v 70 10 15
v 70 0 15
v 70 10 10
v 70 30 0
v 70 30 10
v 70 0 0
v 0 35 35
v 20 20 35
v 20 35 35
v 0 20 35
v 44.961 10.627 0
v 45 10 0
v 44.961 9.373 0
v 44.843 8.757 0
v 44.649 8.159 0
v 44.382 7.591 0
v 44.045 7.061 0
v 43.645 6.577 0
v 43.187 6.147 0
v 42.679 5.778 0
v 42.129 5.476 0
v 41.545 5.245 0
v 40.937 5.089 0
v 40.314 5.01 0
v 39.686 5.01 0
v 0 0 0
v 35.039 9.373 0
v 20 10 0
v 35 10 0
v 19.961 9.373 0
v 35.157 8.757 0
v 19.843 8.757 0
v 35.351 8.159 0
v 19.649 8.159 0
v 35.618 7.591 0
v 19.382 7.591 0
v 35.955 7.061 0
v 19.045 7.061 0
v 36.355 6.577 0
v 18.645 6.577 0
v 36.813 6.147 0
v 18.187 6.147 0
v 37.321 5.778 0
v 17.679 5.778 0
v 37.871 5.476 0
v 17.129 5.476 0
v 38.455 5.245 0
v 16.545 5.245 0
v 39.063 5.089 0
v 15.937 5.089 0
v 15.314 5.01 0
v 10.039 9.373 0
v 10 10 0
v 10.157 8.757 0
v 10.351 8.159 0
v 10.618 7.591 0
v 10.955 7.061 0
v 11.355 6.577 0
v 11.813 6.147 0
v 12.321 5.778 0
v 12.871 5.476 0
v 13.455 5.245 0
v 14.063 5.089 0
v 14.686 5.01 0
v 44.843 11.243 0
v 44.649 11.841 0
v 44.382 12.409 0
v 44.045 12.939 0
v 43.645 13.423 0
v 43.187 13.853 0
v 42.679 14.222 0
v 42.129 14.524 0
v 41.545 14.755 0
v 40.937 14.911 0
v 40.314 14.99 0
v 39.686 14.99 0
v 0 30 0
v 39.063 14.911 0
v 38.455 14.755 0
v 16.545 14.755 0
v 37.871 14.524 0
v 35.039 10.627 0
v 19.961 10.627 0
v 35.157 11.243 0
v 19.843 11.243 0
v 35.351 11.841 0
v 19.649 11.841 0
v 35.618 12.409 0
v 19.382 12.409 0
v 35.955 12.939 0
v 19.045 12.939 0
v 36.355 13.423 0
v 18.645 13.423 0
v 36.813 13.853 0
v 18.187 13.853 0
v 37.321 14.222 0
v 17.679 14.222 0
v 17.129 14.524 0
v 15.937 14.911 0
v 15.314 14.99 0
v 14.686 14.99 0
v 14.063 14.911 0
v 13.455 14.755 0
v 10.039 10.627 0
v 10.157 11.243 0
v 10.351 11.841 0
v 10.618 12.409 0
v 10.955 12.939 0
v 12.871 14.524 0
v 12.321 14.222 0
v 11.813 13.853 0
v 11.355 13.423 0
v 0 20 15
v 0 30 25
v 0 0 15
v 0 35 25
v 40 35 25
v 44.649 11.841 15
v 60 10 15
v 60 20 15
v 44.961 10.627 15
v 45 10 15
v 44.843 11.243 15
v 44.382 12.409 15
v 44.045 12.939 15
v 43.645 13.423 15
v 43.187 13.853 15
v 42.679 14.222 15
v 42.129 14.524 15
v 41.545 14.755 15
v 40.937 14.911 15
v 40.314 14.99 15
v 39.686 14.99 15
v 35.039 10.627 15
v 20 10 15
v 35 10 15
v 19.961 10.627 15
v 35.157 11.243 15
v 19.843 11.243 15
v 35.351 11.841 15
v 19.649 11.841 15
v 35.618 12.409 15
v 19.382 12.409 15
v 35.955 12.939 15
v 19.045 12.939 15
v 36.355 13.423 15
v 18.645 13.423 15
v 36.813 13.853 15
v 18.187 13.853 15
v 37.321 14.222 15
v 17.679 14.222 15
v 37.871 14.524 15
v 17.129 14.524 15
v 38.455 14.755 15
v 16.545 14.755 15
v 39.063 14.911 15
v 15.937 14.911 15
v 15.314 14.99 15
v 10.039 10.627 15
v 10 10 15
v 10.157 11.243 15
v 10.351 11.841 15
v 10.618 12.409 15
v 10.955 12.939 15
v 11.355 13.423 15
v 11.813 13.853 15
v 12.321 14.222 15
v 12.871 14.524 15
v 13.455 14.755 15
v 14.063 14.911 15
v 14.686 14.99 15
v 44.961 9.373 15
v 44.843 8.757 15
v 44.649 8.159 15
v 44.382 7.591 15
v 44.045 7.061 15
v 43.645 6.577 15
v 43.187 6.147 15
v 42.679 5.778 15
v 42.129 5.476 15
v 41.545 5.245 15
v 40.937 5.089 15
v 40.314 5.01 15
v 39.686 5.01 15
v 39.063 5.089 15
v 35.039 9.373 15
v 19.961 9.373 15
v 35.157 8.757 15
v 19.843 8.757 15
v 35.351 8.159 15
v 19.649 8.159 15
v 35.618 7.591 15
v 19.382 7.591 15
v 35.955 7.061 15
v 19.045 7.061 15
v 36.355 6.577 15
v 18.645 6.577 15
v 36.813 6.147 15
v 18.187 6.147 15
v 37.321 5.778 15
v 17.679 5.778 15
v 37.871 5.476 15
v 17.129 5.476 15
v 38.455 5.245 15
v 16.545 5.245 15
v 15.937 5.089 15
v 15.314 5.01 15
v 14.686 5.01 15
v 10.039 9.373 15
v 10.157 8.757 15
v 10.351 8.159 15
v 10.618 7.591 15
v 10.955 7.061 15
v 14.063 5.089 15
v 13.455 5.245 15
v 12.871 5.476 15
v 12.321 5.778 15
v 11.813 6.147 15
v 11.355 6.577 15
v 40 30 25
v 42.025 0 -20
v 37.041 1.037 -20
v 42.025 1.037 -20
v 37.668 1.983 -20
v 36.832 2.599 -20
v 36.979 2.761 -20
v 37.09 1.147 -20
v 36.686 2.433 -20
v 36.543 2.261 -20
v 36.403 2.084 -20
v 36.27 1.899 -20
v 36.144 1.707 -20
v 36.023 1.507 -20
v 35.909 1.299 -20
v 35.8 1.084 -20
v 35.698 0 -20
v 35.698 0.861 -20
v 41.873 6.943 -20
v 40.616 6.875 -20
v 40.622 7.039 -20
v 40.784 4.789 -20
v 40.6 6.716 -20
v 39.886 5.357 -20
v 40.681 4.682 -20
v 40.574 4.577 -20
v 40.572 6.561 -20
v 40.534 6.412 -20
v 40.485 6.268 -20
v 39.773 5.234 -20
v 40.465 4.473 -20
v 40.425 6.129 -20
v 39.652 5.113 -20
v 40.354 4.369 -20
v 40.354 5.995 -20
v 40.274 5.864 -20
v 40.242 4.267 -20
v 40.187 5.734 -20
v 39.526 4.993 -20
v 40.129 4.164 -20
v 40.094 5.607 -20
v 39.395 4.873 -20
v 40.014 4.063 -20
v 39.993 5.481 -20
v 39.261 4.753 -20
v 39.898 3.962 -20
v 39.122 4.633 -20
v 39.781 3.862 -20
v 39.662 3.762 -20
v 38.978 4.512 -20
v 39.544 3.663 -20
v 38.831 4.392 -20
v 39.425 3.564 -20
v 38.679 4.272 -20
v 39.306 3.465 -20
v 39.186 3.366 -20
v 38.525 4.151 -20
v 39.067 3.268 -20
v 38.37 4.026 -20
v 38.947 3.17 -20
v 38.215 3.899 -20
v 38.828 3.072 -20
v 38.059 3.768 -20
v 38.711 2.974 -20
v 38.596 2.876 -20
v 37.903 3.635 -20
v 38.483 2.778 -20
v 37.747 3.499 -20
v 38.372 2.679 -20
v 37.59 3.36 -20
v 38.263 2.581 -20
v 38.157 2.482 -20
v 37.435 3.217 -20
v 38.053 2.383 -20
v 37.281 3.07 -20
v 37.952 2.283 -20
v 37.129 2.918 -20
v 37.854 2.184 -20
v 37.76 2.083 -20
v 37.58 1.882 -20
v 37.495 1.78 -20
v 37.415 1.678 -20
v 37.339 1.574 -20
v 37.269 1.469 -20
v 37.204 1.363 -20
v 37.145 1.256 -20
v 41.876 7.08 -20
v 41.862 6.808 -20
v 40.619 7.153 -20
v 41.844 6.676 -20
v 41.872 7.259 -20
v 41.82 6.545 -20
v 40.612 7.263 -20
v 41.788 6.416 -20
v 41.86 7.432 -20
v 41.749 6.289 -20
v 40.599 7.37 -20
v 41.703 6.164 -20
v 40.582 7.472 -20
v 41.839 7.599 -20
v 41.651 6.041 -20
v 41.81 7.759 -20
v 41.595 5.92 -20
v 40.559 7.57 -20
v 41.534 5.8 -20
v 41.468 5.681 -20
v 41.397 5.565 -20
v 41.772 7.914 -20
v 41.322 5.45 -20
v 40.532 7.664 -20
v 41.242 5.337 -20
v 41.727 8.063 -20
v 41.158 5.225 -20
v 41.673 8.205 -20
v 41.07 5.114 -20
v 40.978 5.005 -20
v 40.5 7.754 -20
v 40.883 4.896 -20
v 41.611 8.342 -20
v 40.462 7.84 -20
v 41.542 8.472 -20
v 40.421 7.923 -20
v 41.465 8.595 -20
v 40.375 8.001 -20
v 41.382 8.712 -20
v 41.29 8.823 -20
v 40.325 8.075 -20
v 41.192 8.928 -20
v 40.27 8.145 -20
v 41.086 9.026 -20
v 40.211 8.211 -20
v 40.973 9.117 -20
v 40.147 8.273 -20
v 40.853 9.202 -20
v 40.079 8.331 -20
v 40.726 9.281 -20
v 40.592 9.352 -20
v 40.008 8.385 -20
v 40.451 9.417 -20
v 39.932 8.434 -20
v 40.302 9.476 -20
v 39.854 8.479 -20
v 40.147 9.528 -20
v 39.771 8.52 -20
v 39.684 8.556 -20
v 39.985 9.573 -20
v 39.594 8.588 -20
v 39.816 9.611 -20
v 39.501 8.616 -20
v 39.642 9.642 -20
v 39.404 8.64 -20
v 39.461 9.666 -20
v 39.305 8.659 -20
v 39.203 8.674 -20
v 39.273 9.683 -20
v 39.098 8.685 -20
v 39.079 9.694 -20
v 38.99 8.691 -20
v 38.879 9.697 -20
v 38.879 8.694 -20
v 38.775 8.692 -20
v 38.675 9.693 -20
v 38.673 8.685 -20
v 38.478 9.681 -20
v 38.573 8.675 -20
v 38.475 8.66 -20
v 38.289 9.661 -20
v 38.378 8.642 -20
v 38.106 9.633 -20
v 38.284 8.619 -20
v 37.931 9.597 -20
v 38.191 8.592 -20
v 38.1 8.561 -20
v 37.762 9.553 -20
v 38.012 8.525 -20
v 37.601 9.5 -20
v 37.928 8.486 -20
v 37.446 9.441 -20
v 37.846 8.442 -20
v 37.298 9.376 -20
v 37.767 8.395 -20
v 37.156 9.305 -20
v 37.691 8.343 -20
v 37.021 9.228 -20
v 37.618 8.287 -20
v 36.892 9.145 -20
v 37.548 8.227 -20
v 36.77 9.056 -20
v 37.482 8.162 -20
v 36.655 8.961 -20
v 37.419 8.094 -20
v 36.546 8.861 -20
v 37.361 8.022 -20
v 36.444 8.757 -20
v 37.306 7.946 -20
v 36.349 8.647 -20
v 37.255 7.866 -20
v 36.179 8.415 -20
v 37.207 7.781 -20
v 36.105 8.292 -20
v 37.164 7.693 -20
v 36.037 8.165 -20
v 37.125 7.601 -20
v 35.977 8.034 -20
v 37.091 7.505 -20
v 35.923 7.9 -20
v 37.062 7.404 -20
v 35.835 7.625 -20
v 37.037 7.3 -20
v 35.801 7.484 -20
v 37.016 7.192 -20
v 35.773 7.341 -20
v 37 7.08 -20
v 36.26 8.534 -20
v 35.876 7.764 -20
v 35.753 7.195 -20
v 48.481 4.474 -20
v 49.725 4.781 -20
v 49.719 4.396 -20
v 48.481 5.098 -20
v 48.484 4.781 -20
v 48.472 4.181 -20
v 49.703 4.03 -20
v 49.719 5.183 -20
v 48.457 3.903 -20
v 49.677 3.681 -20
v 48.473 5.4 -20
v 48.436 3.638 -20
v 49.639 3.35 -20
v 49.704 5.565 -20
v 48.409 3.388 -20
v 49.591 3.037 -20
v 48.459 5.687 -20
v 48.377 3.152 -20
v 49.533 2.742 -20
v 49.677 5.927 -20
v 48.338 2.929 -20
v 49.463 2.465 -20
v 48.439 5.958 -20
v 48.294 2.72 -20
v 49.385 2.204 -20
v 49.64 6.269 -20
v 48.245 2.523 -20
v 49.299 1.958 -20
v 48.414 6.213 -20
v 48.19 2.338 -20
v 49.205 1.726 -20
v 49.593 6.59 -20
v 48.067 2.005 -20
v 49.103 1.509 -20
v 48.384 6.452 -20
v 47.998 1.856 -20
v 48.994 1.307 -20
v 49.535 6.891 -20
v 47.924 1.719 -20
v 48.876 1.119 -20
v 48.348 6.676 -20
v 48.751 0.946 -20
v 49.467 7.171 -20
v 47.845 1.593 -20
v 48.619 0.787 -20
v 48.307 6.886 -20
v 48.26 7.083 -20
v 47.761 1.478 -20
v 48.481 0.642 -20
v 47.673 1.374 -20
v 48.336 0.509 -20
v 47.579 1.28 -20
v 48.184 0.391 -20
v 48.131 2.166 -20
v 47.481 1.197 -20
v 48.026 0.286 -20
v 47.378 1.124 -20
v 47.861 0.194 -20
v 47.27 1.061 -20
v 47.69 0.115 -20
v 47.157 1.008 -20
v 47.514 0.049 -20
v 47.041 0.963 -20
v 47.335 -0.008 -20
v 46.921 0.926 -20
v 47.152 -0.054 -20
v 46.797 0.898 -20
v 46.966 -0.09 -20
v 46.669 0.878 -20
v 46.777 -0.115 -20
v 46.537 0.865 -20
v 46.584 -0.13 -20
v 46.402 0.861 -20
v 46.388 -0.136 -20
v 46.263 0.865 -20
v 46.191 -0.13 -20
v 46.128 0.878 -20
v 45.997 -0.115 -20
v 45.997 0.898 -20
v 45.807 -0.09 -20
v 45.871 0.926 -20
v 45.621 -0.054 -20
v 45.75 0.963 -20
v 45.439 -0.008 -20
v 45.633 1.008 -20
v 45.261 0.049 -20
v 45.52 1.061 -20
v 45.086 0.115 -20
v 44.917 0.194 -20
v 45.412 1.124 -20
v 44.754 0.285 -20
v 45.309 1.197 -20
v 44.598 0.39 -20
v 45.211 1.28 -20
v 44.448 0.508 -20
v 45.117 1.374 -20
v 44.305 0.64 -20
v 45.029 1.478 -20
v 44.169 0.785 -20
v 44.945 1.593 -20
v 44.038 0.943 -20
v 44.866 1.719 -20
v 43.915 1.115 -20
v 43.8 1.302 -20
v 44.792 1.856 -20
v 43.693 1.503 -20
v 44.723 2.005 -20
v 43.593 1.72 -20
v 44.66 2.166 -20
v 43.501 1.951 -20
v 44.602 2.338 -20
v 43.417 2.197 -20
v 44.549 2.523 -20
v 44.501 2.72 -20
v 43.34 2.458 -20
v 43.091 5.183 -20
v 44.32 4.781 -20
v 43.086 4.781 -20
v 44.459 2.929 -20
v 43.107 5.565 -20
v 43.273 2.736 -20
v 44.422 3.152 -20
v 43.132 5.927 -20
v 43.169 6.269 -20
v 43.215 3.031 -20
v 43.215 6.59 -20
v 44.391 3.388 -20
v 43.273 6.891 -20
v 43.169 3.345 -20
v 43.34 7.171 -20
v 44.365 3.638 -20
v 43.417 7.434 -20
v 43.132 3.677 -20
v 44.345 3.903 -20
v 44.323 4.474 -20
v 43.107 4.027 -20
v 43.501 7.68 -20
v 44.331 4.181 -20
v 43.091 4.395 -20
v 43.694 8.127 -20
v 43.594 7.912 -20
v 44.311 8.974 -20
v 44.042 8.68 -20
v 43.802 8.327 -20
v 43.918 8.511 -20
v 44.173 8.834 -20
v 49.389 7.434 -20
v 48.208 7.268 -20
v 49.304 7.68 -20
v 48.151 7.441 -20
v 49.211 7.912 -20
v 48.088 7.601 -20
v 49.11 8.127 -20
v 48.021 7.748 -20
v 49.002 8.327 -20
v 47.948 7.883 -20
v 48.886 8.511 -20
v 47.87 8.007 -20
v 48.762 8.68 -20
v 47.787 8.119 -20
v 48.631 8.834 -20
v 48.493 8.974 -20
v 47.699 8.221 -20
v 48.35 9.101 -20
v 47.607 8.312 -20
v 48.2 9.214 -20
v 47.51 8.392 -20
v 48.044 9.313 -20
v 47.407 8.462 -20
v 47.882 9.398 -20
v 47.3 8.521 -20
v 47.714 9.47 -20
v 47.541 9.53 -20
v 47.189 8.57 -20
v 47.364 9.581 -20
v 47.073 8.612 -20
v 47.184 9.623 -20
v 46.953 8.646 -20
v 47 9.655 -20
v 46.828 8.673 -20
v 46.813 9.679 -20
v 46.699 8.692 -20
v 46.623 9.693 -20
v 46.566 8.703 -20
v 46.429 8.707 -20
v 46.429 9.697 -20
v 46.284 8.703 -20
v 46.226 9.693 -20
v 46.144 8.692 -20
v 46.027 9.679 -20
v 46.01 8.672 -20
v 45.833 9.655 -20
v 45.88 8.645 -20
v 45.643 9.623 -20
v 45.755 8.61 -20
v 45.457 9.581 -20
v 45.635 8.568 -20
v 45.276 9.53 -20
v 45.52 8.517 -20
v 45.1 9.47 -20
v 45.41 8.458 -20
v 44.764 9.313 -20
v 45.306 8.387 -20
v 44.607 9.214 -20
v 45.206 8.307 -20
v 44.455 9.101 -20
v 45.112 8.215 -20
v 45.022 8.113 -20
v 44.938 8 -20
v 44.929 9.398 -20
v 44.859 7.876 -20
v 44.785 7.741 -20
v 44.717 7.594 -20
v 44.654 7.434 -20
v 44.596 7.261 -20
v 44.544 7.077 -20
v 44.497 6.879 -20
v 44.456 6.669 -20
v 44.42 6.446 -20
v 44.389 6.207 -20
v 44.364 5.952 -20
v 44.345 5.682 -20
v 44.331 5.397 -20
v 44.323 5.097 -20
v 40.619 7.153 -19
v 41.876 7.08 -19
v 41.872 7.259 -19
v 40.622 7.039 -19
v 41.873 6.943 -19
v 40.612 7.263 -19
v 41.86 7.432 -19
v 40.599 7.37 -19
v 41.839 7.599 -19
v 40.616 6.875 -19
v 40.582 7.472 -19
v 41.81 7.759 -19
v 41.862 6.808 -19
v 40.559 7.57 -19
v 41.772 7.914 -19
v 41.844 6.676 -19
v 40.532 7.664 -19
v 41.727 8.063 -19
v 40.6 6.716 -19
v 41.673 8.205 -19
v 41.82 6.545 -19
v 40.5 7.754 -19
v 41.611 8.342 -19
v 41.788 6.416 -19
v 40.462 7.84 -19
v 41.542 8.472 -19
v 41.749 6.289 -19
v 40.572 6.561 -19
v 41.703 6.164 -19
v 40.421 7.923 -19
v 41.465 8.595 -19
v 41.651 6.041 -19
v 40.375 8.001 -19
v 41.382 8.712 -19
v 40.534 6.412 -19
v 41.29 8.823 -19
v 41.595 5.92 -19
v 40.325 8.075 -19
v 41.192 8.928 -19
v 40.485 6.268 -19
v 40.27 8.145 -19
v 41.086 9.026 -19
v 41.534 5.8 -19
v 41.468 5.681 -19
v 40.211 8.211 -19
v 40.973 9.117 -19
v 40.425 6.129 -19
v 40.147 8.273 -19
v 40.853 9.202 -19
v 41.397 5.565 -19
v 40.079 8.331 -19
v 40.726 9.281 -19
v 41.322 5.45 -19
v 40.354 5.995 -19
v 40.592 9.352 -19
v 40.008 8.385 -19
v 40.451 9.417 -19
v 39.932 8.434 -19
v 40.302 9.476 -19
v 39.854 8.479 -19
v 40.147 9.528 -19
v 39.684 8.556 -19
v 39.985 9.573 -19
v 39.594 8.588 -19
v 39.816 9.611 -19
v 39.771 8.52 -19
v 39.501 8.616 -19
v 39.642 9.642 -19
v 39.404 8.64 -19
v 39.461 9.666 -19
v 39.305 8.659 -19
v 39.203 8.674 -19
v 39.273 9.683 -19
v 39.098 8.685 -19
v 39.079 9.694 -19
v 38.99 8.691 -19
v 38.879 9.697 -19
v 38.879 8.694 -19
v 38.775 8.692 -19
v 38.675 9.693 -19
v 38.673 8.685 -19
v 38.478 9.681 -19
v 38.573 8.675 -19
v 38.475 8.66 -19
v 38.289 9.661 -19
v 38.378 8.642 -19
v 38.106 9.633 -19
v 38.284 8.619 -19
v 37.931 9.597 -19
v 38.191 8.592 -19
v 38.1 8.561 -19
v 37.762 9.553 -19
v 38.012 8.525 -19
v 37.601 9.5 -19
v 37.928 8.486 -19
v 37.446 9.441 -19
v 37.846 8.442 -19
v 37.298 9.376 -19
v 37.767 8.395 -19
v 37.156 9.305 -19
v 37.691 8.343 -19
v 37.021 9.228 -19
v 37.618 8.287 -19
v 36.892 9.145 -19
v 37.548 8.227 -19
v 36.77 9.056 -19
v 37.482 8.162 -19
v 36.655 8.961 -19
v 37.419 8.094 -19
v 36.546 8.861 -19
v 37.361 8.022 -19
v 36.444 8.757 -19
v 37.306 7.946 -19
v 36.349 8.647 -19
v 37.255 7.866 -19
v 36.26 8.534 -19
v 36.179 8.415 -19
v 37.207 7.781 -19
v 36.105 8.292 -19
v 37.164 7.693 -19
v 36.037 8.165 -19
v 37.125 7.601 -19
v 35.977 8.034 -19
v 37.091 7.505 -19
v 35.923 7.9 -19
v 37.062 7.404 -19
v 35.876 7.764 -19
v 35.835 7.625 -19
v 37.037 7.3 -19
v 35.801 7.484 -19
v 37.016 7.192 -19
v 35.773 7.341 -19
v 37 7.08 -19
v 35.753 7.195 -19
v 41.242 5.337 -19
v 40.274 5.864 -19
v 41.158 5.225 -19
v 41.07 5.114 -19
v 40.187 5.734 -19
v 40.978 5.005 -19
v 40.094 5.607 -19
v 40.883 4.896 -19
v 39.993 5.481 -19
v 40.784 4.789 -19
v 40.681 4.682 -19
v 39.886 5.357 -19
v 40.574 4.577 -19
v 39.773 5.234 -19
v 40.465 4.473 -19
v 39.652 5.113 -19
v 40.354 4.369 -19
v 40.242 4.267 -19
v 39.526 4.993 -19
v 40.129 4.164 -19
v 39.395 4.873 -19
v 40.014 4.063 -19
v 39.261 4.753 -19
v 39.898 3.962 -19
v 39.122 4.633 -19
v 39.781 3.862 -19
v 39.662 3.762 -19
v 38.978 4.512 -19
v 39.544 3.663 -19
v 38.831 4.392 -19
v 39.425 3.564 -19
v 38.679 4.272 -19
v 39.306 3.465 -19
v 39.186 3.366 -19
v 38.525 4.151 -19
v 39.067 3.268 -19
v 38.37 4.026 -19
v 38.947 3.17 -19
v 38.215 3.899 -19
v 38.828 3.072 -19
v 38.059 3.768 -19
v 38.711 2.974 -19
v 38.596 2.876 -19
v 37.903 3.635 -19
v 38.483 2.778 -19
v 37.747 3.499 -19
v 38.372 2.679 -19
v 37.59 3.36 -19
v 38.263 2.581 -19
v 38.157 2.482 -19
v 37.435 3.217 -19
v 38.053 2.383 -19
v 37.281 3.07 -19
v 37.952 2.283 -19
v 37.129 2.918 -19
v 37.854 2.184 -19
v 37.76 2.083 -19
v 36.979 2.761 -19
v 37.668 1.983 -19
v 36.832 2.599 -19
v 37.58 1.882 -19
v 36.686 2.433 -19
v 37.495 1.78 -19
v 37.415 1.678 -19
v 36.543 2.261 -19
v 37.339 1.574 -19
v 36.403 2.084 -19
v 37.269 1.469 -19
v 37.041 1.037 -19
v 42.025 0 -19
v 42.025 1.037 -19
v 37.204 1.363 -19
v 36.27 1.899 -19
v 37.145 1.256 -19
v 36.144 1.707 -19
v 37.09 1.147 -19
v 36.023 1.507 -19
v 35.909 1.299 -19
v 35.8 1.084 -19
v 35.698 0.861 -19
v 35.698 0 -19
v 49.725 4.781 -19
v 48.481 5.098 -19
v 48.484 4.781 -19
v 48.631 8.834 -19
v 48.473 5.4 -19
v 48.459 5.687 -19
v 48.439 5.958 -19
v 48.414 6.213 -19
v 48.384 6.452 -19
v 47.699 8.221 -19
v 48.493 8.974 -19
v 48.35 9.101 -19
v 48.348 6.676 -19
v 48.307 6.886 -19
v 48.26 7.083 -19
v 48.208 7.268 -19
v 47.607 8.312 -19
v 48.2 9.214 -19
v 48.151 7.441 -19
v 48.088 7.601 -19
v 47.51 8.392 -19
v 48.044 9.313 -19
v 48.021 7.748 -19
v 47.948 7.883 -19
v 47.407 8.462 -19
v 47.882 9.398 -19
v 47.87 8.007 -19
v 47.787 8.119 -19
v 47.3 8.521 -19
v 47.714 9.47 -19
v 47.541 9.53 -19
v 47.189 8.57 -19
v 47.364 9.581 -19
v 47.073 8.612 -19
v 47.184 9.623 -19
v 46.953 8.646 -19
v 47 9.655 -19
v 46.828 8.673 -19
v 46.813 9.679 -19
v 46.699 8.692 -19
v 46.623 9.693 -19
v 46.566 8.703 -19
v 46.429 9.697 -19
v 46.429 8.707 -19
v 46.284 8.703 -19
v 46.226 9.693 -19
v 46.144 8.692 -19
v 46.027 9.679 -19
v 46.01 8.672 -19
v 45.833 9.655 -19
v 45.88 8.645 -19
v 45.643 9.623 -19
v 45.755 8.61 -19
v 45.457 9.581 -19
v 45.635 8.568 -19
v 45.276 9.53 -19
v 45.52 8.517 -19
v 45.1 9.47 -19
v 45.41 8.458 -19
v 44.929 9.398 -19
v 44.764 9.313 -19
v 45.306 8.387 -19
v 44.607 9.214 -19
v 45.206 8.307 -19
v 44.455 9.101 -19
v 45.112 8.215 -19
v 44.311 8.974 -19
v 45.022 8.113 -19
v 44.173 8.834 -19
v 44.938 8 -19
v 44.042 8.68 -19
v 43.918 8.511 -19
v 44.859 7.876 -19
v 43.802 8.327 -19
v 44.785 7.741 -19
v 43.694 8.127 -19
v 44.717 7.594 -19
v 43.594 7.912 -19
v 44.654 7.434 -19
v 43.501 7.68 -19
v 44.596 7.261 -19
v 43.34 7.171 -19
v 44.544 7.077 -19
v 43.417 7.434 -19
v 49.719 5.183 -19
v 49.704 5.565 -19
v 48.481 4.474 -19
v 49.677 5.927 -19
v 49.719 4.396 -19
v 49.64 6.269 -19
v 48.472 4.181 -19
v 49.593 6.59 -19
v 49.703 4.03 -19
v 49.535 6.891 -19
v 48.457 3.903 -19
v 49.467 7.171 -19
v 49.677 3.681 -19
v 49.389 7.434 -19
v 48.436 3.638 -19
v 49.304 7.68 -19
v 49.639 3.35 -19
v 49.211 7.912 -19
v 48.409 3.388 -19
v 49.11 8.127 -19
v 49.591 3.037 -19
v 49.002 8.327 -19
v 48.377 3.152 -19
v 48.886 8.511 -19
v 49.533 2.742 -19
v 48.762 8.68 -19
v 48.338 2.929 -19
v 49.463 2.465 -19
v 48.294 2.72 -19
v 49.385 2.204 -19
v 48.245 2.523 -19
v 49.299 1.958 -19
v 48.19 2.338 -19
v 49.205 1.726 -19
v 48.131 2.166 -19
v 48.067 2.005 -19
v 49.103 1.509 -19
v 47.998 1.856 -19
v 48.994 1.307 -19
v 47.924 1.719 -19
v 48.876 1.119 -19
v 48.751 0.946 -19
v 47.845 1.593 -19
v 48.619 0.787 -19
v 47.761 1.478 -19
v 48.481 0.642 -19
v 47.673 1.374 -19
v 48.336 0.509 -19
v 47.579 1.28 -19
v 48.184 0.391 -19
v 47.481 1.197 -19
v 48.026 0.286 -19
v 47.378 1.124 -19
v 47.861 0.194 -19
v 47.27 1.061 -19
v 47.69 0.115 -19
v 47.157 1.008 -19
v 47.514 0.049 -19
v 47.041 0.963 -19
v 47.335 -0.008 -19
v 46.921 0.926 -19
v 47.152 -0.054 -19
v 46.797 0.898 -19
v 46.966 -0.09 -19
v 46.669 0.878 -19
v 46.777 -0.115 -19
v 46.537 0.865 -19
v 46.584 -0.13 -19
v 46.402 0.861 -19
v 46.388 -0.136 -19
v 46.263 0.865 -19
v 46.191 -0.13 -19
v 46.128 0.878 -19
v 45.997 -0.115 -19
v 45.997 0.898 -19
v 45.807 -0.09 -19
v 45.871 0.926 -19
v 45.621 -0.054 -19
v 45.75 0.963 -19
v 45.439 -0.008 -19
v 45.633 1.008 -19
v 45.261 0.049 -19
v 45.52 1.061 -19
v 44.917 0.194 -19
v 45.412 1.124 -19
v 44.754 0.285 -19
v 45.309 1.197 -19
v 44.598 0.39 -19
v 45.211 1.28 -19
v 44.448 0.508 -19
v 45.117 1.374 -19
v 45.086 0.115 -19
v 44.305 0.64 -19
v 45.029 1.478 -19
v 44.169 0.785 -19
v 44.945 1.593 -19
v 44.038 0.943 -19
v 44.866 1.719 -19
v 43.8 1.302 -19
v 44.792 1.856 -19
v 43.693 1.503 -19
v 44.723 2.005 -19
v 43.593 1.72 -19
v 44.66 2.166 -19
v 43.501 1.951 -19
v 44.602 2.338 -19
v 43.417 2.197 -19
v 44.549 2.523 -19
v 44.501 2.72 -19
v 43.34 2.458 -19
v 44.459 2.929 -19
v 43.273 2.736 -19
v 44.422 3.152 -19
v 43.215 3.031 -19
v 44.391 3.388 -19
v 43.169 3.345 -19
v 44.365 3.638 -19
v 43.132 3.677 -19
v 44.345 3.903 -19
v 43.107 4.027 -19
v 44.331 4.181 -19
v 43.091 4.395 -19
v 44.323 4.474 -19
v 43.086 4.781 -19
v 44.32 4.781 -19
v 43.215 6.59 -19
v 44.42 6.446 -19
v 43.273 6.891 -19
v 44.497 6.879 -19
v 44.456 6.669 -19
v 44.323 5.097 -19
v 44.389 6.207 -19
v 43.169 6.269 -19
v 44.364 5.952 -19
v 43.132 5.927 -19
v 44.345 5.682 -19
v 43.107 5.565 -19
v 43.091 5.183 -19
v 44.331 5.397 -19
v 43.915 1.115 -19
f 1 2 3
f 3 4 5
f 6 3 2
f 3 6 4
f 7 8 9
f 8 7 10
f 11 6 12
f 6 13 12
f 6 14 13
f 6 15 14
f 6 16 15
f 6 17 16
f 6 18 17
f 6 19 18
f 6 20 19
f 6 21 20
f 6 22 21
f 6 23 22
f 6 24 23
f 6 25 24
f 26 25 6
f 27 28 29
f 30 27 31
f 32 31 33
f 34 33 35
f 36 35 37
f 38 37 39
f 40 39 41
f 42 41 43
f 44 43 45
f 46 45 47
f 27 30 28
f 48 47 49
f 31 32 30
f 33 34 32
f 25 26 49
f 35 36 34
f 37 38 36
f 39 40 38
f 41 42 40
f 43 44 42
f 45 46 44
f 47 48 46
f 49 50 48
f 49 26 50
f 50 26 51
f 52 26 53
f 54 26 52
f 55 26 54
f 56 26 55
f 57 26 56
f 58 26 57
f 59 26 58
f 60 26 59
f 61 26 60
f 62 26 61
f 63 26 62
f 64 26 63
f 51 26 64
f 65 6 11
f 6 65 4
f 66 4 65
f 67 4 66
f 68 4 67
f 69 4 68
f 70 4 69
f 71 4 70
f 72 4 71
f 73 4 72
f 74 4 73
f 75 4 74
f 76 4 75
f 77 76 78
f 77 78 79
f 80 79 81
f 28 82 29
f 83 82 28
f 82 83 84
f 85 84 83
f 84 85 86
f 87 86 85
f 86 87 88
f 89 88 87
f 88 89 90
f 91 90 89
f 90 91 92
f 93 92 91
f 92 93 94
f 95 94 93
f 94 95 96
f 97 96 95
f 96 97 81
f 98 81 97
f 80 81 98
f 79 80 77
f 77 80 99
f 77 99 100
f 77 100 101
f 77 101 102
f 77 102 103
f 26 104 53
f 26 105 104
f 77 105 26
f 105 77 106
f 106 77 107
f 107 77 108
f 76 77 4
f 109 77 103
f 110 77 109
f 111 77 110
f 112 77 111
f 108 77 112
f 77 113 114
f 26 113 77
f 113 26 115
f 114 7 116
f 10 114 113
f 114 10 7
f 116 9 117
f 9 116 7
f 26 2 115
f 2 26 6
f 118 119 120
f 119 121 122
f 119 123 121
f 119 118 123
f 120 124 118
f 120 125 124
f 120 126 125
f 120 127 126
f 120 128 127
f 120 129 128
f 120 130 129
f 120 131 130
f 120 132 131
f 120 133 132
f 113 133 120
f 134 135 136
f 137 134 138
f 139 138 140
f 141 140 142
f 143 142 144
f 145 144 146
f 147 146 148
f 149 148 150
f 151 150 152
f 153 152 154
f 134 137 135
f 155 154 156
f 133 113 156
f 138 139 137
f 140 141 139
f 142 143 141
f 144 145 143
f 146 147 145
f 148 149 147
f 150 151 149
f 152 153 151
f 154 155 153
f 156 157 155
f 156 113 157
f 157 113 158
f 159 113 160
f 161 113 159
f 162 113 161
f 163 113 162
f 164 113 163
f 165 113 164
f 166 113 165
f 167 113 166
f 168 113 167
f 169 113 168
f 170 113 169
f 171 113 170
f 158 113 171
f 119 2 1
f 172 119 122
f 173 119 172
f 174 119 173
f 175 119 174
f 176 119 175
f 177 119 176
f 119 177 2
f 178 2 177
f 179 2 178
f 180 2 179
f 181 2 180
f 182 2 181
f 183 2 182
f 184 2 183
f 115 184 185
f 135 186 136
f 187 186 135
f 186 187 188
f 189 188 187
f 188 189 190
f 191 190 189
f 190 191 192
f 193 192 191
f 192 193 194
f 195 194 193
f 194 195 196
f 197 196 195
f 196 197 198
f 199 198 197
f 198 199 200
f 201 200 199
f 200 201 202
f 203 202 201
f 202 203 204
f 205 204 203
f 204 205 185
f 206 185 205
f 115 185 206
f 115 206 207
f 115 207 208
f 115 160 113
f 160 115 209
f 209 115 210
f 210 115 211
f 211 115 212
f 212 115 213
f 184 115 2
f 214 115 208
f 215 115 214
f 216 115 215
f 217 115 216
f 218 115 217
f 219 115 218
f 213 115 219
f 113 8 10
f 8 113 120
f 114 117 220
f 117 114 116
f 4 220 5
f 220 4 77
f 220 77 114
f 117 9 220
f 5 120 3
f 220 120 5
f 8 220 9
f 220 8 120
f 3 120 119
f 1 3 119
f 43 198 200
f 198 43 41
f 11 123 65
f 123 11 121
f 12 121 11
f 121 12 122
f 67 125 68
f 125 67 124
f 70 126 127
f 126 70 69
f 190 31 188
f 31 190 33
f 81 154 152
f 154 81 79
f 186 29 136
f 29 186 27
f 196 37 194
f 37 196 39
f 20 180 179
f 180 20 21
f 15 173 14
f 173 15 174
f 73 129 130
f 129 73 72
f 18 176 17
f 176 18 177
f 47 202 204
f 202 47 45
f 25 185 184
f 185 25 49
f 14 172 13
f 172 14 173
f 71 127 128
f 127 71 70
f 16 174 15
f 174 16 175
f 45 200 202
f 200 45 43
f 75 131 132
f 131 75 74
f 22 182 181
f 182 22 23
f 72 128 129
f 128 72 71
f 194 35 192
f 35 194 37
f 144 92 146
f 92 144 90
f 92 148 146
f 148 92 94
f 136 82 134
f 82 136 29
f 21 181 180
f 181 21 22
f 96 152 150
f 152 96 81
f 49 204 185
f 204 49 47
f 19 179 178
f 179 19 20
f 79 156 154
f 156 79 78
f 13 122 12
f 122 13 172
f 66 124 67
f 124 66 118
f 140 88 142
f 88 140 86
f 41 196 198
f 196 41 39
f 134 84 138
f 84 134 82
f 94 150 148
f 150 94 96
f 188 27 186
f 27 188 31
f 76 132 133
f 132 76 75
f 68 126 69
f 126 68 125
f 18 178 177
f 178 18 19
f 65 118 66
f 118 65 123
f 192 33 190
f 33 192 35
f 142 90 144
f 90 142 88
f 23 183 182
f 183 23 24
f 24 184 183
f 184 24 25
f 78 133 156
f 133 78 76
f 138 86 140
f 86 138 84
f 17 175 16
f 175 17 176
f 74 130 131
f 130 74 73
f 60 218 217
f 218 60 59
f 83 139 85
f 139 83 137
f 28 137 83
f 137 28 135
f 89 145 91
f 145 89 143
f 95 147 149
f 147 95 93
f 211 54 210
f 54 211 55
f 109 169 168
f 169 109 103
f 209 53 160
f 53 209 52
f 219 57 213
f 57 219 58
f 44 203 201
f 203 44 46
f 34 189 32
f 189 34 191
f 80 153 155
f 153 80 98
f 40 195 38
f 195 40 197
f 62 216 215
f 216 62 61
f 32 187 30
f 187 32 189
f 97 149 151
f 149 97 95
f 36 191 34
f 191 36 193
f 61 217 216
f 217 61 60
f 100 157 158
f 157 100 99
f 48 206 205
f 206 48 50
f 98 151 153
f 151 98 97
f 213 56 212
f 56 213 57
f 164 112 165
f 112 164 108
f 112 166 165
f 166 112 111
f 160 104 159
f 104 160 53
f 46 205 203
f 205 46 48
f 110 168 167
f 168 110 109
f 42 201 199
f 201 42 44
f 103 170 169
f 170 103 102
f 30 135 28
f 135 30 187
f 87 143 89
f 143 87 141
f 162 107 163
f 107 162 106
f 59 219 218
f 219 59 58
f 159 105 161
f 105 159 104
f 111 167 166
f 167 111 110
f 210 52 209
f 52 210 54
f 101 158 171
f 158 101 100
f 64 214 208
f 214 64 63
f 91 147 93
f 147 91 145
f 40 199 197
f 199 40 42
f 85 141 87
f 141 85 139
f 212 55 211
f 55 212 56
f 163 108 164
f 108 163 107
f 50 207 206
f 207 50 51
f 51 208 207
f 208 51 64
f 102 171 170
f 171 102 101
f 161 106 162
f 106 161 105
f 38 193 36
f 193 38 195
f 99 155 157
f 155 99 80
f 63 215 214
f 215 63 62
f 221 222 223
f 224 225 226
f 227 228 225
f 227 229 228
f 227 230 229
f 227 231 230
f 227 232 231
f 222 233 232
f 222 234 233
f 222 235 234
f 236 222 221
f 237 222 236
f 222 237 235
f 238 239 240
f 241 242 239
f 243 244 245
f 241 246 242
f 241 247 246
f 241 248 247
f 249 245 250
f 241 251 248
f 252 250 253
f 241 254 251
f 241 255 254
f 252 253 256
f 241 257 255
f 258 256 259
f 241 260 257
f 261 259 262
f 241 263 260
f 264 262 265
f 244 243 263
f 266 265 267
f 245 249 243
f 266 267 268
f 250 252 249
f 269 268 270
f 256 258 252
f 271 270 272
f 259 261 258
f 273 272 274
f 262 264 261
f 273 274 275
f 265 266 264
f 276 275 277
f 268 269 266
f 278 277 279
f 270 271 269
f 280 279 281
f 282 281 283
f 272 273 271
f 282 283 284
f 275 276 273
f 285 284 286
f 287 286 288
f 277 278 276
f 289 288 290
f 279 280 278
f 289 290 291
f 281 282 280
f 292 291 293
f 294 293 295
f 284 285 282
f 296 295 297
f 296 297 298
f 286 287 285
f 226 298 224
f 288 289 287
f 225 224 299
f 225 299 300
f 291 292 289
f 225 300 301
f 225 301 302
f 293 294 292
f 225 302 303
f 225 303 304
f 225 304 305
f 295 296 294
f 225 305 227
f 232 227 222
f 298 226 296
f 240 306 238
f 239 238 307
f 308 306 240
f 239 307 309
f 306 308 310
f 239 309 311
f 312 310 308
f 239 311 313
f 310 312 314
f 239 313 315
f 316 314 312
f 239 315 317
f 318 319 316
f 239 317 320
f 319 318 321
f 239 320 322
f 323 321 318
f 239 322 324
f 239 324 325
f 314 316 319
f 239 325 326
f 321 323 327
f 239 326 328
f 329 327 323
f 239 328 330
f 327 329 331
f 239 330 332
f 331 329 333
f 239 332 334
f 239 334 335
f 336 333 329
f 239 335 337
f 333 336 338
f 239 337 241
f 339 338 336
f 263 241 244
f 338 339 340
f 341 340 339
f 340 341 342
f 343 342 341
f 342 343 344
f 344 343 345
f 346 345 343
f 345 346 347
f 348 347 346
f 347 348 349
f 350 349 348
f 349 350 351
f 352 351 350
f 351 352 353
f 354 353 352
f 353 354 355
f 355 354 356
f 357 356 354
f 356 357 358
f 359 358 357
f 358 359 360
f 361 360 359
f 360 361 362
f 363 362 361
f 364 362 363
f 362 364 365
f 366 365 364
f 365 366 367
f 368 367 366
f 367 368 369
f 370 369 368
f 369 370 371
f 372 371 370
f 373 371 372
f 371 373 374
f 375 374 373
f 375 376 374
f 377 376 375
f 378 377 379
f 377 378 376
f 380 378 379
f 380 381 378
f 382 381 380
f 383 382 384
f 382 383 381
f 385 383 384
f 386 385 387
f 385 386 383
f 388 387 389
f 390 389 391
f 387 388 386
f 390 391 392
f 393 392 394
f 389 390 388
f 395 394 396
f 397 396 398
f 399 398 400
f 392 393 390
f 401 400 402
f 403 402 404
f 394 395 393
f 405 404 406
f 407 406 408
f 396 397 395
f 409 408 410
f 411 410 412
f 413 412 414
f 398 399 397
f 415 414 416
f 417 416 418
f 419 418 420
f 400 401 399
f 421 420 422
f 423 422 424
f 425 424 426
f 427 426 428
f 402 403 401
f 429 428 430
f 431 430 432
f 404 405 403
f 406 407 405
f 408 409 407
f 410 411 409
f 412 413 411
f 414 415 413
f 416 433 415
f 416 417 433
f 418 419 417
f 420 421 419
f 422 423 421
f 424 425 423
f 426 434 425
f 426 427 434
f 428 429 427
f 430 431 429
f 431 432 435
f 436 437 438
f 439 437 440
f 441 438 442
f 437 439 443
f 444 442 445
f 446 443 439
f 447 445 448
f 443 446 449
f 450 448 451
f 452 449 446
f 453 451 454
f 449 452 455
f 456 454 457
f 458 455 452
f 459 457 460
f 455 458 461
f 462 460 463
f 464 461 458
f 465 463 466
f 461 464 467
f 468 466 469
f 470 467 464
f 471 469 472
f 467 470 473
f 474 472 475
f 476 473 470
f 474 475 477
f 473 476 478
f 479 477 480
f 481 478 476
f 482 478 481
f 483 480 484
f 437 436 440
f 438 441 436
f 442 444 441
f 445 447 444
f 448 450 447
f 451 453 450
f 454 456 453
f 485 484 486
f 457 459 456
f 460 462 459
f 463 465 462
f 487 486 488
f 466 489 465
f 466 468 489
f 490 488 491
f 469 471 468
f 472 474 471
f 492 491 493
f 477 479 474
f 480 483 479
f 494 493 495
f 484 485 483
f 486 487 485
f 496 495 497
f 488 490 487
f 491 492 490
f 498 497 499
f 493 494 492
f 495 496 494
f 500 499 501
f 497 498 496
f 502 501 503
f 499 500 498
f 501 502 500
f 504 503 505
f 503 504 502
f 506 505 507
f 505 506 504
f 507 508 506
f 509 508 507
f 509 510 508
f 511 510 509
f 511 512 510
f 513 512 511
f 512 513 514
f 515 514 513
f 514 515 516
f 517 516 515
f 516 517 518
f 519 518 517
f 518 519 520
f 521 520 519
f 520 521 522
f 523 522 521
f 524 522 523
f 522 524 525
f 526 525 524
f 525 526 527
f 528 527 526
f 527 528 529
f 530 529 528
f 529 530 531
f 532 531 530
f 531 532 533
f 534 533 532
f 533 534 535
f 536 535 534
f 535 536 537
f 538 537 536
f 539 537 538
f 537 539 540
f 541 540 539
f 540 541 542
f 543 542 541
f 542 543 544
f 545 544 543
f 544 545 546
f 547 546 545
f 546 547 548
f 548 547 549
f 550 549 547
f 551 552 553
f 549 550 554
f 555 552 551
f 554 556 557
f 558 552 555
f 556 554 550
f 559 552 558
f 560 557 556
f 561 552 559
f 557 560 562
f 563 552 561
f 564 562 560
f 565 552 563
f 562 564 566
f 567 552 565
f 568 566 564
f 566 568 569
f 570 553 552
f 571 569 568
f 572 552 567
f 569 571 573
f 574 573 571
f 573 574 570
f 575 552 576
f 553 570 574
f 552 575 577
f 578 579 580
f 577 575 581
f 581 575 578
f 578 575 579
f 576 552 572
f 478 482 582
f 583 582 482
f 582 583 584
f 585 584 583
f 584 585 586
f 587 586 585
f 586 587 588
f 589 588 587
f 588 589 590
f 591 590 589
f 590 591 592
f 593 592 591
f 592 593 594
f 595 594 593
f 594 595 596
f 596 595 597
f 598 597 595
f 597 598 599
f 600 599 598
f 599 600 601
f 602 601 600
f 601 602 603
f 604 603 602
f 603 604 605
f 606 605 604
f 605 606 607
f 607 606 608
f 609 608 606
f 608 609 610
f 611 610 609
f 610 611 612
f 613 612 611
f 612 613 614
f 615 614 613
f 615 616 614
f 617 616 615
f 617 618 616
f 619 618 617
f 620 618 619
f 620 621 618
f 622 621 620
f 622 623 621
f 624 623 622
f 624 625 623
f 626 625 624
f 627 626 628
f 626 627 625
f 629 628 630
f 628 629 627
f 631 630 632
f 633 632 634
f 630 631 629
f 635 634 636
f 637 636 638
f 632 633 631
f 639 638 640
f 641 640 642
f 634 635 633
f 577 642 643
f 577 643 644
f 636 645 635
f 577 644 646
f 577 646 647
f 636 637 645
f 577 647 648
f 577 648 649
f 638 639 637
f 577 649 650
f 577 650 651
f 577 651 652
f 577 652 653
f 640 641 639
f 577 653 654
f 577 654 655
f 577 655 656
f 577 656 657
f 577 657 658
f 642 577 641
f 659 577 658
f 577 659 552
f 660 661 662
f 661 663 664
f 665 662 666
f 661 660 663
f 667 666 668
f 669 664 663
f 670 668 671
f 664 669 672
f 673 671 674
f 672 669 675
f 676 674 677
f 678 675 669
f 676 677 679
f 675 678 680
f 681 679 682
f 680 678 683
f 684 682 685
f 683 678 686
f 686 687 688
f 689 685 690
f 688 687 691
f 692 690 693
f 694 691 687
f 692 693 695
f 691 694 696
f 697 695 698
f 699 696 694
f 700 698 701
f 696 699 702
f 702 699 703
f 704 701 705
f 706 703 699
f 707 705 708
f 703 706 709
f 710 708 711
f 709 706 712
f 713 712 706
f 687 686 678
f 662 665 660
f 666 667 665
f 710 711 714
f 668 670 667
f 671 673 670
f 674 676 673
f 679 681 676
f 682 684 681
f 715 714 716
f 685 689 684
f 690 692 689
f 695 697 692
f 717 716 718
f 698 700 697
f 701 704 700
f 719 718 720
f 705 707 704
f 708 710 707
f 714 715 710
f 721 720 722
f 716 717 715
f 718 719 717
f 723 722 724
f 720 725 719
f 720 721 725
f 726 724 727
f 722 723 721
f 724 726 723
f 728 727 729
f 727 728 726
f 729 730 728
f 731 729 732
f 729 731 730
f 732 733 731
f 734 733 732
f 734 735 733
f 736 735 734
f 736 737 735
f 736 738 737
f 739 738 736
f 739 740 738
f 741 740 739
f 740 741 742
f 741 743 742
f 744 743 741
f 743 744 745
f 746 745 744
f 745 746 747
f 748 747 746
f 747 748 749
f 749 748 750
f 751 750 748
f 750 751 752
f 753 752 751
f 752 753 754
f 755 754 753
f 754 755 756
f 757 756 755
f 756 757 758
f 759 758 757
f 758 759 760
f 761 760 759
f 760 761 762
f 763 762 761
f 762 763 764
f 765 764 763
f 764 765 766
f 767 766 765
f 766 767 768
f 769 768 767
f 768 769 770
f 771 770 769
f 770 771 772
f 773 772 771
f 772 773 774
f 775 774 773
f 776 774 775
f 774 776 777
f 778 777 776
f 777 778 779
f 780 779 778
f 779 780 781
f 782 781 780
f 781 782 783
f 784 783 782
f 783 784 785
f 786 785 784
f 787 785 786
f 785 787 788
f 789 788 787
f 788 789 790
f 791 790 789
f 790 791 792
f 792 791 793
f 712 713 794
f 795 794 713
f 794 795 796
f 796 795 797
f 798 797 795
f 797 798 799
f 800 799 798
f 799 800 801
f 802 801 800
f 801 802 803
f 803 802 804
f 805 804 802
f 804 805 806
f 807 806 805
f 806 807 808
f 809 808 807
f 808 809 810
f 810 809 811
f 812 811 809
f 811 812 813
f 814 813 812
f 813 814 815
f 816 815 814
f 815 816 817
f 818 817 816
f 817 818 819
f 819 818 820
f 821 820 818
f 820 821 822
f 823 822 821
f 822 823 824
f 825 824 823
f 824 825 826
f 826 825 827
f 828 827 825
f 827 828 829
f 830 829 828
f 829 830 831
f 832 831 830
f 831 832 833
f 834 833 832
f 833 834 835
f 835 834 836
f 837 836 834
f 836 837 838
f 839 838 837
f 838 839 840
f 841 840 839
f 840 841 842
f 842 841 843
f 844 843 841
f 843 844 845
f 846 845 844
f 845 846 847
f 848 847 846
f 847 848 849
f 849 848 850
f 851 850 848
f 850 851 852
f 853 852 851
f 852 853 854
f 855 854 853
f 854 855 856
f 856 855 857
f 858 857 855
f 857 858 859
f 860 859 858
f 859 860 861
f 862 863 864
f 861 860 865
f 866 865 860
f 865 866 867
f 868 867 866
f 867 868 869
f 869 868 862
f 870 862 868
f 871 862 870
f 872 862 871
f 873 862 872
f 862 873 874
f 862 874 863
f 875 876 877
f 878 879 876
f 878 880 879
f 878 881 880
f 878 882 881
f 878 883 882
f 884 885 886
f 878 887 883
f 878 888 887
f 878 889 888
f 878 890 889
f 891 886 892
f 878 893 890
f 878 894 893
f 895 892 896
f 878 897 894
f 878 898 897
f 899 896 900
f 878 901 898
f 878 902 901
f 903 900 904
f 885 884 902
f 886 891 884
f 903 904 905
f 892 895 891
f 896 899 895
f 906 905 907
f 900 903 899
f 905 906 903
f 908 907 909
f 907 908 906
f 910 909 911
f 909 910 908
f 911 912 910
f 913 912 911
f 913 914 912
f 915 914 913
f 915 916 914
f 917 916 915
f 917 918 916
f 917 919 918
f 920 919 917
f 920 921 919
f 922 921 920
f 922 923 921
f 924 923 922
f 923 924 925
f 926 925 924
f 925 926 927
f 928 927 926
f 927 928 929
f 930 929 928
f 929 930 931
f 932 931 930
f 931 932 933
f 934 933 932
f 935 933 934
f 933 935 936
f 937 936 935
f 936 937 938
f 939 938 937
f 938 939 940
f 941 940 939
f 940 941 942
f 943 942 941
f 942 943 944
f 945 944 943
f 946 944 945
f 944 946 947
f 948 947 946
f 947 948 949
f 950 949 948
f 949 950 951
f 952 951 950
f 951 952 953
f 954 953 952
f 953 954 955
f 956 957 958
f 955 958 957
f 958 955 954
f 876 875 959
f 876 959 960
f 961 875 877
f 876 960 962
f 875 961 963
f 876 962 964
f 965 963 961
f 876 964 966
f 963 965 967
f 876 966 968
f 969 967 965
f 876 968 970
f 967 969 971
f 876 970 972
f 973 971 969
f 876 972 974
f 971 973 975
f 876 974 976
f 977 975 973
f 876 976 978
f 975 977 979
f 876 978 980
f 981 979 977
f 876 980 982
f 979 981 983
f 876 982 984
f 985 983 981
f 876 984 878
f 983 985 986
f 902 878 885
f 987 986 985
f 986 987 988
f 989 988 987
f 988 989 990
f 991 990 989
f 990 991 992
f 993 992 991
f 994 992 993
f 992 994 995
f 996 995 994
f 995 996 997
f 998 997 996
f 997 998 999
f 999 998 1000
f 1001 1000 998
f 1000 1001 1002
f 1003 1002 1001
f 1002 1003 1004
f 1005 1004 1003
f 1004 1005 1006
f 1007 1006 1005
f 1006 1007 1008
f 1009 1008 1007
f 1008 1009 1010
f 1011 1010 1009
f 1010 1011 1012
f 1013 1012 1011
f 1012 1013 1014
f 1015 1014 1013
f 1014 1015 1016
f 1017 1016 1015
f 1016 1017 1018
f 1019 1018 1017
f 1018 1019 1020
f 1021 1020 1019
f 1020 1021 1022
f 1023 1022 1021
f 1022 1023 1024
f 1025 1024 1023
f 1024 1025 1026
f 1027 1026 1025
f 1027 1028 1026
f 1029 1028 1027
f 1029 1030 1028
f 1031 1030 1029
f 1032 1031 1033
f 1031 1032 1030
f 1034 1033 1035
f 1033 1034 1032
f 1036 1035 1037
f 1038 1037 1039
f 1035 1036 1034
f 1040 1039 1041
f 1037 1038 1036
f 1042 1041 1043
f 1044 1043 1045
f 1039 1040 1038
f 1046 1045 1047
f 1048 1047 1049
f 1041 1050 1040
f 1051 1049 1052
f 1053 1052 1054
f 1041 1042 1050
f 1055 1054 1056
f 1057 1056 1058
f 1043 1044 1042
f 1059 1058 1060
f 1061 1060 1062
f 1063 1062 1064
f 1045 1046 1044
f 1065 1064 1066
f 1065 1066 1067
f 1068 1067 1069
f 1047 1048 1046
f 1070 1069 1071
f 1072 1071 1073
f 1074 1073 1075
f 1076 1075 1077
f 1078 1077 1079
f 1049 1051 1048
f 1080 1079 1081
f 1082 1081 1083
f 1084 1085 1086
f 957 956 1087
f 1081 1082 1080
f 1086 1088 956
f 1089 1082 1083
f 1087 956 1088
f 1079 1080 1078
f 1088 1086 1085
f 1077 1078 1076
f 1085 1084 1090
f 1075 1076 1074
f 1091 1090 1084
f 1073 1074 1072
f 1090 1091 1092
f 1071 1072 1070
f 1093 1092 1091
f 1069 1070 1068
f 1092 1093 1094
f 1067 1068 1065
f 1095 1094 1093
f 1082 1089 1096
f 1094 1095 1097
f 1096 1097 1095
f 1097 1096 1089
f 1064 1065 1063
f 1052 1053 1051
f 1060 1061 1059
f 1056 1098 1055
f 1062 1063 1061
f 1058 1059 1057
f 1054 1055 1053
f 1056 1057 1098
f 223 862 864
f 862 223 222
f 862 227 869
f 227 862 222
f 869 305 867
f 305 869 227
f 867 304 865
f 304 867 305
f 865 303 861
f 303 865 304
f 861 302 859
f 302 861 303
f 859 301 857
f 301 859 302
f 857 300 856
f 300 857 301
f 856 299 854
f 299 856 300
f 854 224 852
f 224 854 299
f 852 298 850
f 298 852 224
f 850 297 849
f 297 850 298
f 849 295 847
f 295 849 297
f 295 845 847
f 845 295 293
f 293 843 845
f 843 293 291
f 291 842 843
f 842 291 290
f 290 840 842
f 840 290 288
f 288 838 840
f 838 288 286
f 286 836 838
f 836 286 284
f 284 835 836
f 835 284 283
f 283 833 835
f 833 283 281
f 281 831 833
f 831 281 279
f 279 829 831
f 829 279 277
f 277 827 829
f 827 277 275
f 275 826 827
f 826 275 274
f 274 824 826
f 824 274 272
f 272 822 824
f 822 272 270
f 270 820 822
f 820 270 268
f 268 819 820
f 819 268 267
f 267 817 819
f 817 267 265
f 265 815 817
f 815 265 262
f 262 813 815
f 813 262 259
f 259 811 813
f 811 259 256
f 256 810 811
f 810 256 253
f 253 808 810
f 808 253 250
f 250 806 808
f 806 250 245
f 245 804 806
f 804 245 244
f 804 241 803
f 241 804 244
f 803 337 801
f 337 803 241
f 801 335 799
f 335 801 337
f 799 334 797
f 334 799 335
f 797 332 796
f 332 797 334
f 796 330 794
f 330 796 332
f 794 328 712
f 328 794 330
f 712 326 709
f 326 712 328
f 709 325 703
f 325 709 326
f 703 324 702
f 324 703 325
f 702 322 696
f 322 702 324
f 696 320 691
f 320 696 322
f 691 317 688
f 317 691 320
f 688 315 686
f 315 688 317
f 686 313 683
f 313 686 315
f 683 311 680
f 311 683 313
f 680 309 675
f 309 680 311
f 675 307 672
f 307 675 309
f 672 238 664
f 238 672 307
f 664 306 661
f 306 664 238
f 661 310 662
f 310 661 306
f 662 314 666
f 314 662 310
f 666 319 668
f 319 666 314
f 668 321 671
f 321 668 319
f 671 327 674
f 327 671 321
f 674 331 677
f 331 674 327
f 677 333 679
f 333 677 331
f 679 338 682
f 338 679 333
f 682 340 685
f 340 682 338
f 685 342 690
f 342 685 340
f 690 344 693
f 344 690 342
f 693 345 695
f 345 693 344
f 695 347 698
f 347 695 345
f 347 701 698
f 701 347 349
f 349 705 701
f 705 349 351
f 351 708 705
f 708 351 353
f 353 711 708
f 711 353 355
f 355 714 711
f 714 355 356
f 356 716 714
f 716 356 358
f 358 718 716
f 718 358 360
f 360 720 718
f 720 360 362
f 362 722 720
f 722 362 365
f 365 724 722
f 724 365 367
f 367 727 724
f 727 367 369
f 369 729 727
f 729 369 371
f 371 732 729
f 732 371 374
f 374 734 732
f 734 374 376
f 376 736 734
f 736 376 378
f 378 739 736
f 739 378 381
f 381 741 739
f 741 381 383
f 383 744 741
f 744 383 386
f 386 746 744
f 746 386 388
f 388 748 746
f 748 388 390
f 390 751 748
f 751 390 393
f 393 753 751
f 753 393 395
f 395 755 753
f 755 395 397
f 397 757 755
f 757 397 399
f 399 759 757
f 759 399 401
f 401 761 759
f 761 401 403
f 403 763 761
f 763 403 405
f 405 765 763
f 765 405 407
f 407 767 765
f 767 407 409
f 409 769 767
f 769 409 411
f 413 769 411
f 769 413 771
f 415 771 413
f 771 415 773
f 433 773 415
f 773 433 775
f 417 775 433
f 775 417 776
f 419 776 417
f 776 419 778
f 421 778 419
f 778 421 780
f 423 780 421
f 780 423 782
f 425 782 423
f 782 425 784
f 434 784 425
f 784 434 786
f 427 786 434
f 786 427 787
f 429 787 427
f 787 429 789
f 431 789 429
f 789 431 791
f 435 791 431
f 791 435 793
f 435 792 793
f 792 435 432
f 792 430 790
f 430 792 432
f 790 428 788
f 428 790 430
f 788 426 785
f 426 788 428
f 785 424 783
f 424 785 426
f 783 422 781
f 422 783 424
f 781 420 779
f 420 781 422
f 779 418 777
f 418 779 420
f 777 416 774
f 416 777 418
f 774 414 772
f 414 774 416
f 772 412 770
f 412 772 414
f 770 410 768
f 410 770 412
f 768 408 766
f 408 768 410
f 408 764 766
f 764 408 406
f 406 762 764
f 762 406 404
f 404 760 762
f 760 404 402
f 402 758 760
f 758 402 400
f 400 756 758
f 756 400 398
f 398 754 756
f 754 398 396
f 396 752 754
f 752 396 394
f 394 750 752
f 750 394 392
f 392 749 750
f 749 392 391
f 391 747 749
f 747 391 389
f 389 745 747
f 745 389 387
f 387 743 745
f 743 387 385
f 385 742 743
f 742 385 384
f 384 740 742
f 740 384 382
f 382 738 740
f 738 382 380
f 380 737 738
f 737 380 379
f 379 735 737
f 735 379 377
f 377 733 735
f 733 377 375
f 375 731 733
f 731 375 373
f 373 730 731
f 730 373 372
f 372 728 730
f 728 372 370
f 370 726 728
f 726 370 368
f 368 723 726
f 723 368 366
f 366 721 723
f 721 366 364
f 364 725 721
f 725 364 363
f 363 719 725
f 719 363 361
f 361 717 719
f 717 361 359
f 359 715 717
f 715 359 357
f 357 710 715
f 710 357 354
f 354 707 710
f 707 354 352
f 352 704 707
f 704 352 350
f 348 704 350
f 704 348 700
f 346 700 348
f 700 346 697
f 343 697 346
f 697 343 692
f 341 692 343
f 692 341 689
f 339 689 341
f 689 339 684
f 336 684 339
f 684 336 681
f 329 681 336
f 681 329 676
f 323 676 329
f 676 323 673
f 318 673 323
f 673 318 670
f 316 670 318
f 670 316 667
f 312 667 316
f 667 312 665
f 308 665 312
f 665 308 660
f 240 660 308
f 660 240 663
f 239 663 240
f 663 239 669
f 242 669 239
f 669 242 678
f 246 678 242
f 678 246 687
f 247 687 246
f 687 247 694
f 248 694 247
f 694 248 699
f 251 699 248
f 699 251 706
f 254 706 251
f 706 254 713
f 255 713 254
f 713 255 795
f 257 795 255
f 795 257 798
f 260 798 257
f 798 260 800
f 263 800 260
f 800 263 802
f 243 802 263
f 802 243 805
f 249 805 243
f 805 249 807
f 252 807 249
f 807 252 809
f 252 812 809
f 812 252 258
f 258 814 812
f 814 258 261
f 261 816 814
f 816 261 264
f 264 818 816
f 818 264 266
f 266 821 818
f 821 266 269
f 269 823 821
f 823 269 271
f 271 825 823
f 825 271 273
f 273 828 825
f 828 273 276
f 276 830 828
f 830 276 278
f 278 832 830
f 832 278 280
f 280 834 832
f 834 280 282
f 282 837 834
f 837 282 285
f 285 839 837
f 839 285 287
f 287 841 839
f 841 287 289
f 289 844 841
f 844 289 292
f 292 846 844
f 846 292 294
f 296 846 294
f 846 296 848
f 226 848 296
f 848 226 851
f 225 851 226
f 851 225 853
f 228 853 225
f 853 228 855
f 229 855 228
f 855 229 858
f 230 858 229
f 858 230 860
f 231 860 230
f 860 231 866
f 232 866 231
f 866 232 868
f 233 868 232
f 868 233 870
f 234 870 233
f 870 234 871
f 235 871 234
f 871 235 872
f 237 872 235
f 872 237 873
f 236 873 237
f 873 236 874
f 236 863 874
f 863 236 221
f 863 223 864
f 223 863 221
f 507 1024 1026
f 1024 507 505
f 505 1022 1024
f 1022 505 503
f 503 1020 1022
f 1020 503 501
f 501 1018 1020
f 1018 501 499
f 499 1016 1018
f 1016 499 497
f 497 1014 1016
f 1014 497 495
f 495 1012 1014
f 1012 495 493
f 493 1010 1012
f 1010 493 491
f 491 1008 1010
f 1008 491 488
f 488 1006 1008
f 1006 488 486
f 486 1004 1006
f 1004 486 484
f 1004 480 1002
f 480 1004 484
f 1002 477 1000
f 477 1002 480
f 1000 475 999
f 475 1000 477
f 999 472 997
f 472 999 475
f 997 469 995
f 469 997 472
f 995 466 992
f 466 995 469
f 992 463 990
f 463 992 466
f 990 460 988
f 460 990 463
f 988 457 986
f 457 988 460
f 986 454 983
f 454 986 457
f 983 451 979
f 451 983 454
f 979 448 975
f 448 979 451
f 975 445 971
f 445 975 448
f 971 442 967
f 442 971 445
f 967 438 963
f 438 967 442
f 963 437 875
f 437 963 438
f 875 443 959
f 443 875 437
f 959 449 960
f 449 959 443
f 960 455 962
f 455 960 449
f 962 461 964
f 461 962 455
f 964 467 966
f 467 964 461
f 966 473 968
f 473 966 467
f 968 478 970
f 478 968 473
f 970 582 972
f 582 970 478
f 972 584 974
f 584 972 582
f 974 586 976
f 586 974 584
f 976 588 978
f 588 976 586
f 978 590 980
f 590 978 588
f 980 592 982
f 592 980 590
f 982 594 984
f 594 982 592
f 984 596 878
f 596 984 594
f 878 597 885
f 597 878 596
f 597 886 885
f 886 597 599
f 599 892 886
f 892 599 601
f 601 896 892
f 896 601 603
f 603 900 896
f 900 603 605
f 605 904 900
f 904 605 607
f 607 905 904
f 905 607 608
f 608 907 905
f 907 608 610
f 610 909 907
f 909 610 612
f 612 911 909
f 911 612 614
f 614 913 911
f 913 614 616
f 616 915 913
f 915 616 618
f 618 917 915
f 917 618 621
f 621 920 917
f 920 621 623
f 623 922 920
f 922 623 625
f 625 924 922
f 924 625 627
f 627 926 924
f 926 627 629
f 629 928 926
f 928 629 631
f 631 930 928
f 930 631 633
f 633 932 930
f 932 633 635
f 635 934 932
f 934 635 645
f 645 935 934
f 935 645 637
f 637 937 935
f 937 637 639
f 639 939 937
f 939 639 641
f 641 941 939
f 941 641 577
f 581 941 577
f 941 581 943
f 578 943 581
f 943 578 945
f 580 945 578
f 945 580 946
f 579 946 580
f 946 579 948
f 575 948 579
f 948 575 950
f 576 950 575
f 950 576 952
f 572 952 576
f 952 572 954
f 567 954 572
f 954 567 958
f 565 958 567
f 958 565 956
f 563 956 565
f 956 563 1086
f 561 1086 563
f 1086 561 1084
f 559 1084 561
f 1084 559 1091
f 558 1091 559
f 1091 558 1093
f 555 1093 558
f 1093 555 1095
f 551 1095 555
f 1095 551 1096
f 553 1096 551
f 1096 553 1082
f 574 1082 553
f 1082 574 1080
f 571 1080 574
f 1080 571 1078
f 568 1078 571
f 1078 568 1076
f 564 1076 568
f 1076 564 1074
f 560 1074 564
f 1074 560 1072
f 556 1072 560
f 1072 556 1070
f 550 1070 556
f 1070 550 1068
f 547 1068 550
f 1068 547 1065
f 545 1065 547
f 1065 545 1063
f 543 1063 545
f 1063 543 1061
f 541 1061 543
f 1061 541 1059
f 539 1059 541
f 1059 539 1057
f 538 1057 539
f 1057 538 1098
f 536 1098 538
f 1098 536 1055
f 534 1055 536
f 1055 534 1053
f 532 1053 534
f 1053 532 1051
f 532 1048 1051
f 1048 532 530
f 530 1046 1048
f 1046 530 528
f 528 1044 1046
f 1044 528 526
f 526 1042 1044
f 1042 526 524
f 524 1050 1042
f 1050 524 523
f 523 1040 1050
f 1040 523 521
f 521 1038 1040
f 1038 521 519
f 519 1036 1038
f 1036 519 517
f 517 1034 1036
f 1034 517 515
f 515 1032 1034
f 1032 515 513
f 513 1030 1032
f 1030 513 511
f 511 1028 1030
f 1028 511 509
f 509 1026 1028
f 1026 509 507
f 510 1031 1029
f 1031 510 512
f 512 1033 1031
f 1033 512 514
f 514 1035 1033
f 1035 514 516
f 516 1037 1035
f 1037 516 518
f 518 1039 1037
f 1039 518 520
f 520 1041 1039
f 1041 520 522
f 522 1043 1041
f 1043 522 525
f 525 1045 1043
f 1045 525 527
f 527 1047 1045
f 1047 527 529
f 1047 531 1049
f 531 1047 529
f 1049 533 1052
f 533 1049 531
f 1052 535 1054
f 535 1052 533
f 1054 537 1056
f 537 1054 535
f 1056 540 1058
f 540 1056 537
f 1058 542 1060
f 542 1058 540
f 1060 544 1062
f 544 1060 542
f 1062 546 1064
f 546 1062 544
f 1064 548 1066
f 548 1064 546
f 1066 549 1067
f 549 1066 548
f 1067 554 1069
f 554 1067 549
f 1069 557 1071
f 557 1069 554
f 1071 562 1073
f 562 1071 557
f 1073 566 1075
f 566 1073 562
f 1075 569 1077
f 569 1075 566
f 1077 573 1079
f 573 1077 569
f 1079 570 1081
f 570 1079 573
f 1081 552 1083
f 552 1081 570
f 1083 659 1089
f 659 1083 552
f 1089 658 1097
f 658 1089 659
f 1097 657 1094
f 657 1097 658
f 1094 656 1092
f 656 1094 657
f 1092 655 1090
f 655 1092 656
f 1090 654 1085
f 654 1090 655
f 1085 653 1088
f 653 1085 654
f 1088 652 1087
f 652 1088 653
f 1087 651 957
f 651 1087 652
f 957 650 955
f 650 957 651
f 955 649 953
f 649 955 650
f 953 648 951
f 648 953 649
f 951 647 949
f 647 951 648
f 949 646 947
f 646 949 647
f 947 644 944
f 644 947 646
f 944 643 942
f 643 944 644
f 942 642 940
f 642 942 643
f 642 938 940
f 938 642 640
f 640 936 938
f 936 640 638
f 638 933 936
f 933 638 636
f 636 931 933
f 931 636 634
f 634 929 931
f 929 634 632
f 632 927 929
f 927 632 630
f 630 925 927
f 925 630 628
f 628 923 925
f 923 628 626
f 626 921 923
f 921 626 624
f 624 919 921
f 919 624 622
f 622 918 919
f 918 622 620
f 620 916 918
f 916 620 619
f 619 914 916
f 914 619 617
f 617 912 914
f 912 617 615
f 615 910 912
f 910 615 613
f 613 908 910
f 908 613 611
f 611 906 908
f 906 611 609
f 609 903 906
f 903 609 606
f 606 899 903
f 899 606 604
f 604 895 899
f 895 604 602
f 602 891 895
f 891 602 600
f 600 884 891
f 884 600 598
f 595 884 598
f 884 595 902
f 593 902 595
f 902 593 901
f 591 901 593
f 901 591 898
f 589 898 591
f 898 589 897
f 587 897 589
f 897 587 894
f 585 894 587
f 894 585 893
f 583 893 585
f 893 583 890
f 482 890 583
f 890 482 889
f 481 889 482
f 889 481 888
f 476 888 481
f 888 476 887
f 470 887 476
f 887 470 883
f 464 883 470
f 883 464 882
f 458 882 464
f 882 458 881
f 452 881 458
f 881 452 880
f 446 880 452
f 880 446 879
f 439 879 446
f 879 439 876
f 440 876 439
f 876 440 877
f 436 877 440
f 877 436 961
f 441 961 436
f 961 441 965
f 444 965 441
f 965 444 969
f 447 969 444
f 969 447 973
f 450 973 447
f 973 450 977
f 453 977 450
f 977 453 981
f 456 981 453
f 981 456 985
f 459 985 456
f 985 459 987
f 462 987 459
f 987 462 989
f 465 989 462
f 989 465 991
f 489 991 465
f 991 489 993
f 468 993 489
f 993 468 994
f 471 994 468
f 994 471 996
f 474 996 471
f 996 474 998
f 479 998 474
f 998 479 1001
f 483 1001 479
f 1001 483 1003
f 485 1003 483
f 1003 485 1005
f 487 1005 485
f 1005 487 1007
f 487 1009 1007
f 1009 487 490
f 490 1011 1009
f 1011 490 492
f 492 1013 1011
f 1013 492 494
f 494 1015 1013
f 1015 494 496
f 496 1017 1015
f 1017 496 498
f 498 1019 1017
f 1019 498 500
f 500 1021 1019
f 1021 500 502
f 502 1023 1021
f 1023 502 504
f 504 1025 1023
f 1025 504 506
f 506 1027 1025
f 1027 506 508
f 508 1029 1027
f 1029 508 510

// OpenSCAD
$fn=50;

cw=70;
cd=35;
ch=35;
cy=10;

difference() {
    cube([cw,cd,ch]);
    translate([0,0,15])
    cube([cw,20,ch-15]);
    translate([0,cd-5,0])
    cube([cw,5,ch-10]);
    polyhedron(
       points=[[cw,10,10],  //0
               [cw,cd,10],  //1
               [cw,cd,ch],  //2
               [cw,10,ch],  //3
               [20,10,ch],  //4
               [20,cd,ch]   //5
               ],
        faces=[[3,2,0],
               [0,2,1],
               [5,4,0],
               [5,0,1],
               [4,2,3],
               [4,5,2],
               [4,3,0],
               [1,2,5]
               ]);
    translate([40,10,0])
    cylinder(h=15,d=cy);
    translate([15,10,0])
    cylinder(h=15,d=cy);
}

translate([cw/2,0,-20])
linear_extrude(height=1)
text("20");
